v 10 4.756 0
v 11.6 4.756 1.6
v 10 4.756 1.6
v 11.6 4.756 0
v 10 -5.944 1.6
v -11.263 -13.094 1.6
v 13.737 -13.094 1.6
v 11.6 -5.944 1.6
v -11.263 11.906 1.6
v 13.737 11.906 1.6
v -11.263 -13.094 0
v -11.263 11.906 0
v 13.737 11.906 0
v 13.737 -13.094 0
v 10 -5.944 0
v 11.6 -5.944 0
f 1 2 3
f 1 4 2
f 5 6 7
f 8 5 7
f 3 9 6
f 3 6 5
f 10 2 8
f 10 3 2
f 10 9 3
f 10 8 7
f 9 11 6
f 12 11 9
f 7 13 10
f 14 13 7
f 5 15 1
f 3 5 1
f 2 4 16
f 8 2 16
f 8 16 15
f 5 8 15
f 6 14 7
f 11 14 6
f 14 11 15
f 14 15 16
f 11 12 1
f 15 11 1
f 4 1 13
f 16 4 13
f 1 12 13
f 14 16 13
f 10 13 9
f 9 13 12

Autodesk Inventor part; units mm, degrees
ref_plane "YZ Plane" through (0, 0, 0) normal (1, 0, 0) x (0, 1, 0)
ref_plane "XZ Plane" through (0, 0, 0) normal (0, 1, 0) x (-1, 0, 0)
ref_plane "XY Plane" through (0, 0, 0) normal (0, 0, 1) x (1, 0, 0)
sketch "Sketch1" plane through (0, 0, 0) normal (0, 0, 1) x (1, 0, 0)
  line L0 (-11.2628, -8.9945) -> (-11.2628, -13.0945)
  line L1 (-11.2628, 11.9772) -> (-11.2628, 7.8772)
  line L2 (12.7, 5.5055) -> (12.7, -0.323) projected
  line L3 (12.7, -6.6945) -> (-7.3, -6.6945)
  line L4 (12.7, 5.5055) -> (-7.3, 5.5055)
  line L5 (-10.4, -1.4801) -> (-10.4, -2.591) projected
  line L6 (-10.4, 0.291) -> (-10.4, 1.4019) projected
  line L7 (12.7, -6.6945) -> (-10.4, -6.6945)
  line L8 (-10.4, -6.6945) -> (-10.4, 5.5055)
  line L9 (-10.4, 5.5055) -> (12.7, 5.5055)
  line L10 (12.7, 5.5055) -> (12.7, -6.6945)
  line L11 (12.7, 5.5055) -> (-11.2628, 5.5055)
  line L12 (-11.2628, 5.5055) -> (-11.2628, -6.6945)
  line L13 (-11.2628, -6.6945) -> (12.7, -6.6945)
  line L14 (12.7, -6.6945) -> (12.7, 5.5055)
  line L15 (-11.2628, -0.5945) -> (-12.5719, -0.5945)
  line L16 (-11.2628, -0.5945) -> (13.7372, -0.5945)
  line L17 (13.7372, -0.5945) -> (13.7372, -13.0945)
  line L18 (13.7372, -13.0945) -> (-11.2628, -13.0945)
  line L19 (-11.2628, -13.0945) -> (-11.2628, -0.5945)
  line L20 (13.7372, -0.5945) -> (13.7372, 11.9055)
  line L21 (13.7372, 11.9055) -> (-11.2628, 11.9055)
  line L22 (-11.2628, 11.9055) -> (-11.2628, -0.5945)
  line L23 (11.6, -5.6608) -> (10, -5.6608) projected
  line L24 (11.6, 5.0392) -> (10, 5.0392) projected
  line L25 (11.6, 5.0392) -> (11.6, -5.6608) projected
  line L26 (11.6, 5.0392) -> (10, 5.0392) projected
  line L27 (10, -5.6608) -> (10, 5.0392) projected
  line L28 (11.6, -5.6608) -> (10, -5.6608) projected
  line L29 (11.6, -0.5945) -> (11.6, -5.9445)
  line L30 (11.6, -5.9445) -> (10, -5.9445)
  line L31 (10, -5.9445) -> (10, -0.5945)
  line L32 (11.6, -0.5945) -> (11.6, 4.7555)
  line L33 (11.6, 4.7555) -> (10, 4.7555)
  line L34 (10, 4.7555) -> (10, -0.5945)
  point P0 (0, 0)
  point P1 (-11.2628, -6.6945)
  dimension "d2" = 23.9628
  dimension "d3" = 25
  dimension "d4" = 12.5
  dimension "d5" = 5.35
extrude "Extrusion1" add sketch "Sketch1" along normal blind 1.6 contours L19 L13 L7 L3 L10 L16 L17 L18 L0 | L12 L16 L8 L5 L13 | L12 L11 L8 L6 L16 | L8 L5 L16 L27 L31 L30 L29 L25 L10 L3 L7 | L16 L10 L2 L4 L9 L11 L22 L1 L21 L20 | L8 L6 L9 L4 L2 L10 L16 L25 L24 L27 | L27 L24 L25 L33
properties part number "pcb"
